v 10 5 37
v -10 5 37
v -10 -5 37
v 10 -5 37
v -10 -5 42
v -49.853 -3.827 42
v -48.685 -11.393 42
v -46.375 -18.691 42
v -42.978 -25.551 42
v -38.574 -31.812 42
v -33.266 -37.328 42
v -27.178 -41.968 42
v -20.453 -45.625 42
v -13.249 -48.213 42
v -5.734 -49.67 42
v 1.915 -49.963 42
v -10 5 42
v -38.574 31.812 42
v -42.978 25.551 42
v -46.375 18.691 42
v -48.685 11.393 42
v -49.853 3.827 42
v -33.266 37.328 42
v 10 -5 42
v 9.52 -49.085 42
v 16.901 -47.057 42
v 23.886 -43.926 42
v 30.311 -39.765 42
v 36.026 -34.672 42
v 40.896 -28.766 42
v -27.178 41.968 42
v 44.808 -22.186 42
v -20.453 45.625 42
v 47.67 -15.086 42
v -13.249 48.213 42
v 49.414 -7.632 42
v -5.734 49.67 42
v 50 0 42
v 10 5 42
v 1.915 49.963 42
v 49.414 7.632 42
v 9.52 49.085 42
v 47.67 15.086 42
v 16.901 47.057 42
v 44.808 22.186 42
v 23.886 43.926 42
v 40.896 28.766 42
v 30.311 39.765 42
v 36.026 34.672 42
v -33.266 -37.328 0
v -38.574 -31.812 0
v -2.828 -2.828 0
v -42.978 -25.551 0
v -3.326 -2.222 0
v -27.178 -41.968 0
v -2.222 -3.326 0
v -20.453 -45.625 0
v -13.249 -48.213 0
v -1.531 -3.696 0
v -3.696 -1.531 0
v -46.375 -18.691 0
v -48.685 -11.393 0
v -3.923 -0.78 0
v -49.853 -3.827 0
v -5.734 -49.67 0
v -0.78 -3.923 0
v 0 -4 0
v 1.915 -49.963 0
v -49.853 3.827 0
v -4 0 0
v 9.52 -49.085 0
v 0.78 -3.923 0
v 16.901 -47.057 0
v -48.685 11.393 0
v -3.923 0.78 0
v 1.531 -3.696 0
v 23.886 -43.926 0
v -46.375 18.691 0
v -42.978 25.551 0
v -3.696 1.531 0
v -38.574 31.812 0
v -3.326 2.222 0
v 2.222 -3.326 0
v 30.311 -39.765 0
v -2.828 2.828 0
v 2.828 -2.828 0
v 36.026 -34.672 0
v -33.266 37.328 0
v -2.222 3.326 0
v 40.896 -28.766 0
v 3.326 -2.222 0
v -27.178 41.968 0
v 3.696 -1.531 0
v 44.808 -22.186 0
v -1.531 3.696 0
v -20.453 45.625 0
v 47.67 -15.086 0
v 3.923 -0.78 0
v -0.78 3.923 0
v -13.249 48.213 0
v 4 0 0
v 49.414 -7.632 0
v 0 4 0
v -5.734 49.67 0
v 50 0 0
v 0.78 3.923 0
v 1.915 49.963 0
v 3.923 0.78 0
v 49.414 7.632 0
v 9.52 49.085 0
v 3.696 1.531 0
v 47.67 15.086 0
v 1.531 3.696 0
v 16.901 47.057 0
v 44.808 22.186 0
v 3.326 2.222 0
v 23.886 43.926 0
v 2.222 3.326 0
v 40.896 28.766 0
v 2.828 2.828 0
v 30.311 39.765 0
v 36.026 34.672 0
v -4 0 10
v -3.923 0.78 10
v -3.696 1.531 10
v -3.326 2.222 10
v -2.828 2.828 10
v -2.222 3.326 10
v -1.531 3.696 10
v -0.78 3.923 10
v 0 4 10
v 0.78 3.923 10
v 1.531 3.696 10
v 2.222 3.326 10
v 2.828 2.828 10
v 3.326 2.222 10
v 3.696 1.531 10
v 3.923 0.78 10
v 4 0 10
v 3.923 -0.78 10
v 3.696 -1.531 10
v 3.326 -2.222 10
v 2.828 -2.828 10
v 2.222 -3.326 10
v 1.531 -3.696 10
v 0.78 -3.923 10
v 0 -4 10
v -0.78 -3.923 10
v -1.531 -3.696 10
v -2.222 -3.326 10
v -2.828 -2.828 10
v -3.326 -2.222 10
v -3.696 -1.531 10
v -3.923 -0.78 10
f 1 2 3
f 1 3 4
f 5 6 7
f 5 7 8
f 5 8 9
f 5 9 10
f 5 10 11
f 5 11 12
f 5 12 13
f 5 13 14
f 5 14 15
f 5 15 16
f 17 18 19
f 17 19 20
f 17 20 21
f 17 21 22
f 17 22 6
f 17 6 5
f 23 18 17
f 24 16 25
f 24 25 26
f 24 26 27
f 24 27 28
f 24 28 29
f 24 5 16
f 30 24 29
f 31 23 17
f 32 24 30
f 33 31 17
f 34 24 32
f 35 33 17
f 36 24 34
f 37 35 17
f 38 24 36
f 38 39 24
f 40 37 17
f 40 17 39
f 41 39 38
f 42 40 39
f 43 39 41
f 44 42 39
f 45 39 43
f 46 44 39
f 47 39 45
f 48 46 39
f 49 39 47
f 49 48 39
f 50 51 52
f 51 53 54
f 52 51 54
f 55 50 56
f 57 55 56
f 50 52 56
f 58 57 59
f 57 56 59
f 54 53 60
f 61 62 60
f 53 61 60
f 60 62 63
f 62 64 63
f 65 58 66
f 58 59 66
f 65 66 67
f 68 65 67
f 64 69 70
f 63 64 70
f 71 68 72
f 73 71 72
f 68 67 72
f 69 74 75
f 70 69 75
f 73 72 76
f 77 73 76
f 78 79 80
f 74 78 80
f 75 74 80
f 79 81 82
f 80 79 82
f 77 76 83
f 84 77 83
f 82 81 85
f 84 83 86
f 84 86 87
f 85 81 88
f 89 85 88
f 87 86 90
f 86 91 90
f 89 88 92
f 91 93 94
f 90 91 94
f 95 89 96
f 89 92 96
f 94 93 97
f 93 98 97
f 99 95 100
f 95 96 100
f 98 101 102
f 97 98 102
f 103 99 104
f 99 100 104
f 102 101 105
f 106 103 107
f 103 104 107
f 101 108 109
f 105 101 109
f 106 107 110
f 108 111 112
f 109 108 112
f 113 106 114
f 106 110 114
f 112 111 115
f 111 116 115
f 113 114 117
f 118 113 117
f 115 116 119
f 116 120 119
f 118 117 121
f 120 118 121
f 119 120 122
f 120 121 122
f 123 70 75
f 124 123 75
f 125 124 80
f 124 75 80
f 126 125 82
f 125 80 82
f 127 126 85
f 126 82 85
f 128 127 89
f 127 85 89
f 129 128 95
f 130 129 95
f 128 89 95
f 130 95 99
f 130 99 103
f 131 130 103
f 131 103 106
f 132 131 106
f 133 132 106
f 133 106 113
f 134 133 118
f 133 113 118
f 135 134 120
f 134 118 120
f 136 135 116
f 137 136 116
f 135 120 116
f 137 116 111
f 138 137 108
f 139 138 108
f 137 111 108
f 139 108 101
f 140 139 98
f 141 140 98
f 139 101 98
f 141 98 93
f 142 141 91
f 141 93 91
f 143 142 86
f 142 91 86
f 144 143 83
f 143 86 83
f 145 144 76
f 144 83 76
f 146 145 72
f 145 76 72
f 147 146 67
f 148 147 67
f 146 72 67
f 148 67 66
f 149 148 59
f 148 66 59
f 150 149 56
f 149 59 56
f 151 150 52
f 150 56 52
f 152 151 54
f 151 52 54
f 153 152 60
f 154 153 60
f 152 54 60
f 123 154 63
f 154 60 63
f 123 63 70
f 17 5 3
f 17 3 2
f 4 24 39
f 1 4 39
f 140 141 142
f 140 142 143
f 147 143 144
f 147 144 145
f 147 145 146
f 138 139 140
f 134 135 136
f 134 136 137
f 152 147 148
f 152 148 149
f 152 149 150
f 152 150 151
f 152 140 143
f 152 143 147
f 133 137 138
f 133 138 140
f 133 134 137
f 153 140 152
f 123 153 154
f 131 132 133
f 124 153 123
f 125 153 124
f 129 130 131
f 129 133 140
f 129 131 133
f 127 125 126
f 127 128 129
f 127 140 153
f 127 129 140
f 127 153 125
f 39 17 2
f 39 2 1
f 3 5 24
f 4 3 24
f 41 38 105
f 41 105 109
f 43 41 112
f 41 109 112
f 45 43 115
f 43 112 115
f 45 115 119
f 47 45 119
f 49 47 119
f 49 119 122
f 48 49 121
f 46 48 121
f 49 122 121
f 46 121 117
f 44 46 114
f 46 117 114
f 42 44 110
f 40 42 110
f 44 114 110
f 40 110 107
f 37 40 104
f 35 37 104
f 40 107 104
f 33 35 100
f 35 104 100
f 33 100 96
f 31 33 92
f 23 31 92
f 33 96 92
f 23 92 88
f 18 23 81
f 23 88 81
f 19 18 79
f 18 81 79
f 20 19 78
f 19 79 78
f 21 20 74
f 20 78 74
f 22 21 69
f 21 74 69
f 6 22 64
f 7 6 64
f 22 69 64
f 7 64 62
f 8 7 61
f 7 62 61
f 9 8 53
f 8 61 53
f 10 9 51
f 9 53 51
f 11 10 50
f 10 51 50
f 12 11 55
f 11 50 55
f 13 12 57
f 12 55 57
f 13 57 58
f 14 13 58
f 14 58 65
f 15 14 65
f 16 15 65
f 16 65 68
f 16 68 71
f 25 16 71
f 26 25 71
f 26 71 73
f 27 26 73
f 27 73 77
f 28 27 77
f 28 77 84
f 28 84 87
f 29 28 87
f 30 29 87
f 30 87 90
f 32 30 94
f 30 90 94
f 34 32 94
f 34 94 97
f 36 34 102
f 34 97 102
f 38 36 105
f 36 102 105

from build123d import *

# Parameters (mm, degrees)
SKETCH1_R           = 50
BOSS_EXTRUDE2_DEPTH = 42
SKETCH2_R           = 4
CUT_EXTRUDE1_DEPTH  = 10
SKETCH3_W           = 20
SKETCH3_H           = 10
CUT_EXTRUDE3_DEPTH  = 5


with BuildPart() as part:
    # Sketch1 → Boss-Extrude2 (new body)
    with BuildSketch(Plane.XY):
        Circle(SKETCH1_R)
    extrude(amount=BOSS_EXTRUDE2_DEPTH)

    # Sketch2 → Cut-Extrude1 (cut)
    with BuildSketch(Plane(origin=(0, 0, 0), x_dir=(-1, 0, 0), z_dir=(0, 0, -1))):
        Circle(SKETCH2_R)
    extrude(amount=-CUT_EXTRUDE1_DEPTH, mode=Mode.SUBTRACT)

    # Sketch3 → Cut-Extrude3 (cut)
    with BuildSketch(Plane.XY.offset(42)):
        Rectangle(SKETCH3_W, SKETCH3_H)
    extrude(amount=-CUT_EXTRUDE3_DEPTH, mode=Mode.SUBTRACT)


solid = part.part
